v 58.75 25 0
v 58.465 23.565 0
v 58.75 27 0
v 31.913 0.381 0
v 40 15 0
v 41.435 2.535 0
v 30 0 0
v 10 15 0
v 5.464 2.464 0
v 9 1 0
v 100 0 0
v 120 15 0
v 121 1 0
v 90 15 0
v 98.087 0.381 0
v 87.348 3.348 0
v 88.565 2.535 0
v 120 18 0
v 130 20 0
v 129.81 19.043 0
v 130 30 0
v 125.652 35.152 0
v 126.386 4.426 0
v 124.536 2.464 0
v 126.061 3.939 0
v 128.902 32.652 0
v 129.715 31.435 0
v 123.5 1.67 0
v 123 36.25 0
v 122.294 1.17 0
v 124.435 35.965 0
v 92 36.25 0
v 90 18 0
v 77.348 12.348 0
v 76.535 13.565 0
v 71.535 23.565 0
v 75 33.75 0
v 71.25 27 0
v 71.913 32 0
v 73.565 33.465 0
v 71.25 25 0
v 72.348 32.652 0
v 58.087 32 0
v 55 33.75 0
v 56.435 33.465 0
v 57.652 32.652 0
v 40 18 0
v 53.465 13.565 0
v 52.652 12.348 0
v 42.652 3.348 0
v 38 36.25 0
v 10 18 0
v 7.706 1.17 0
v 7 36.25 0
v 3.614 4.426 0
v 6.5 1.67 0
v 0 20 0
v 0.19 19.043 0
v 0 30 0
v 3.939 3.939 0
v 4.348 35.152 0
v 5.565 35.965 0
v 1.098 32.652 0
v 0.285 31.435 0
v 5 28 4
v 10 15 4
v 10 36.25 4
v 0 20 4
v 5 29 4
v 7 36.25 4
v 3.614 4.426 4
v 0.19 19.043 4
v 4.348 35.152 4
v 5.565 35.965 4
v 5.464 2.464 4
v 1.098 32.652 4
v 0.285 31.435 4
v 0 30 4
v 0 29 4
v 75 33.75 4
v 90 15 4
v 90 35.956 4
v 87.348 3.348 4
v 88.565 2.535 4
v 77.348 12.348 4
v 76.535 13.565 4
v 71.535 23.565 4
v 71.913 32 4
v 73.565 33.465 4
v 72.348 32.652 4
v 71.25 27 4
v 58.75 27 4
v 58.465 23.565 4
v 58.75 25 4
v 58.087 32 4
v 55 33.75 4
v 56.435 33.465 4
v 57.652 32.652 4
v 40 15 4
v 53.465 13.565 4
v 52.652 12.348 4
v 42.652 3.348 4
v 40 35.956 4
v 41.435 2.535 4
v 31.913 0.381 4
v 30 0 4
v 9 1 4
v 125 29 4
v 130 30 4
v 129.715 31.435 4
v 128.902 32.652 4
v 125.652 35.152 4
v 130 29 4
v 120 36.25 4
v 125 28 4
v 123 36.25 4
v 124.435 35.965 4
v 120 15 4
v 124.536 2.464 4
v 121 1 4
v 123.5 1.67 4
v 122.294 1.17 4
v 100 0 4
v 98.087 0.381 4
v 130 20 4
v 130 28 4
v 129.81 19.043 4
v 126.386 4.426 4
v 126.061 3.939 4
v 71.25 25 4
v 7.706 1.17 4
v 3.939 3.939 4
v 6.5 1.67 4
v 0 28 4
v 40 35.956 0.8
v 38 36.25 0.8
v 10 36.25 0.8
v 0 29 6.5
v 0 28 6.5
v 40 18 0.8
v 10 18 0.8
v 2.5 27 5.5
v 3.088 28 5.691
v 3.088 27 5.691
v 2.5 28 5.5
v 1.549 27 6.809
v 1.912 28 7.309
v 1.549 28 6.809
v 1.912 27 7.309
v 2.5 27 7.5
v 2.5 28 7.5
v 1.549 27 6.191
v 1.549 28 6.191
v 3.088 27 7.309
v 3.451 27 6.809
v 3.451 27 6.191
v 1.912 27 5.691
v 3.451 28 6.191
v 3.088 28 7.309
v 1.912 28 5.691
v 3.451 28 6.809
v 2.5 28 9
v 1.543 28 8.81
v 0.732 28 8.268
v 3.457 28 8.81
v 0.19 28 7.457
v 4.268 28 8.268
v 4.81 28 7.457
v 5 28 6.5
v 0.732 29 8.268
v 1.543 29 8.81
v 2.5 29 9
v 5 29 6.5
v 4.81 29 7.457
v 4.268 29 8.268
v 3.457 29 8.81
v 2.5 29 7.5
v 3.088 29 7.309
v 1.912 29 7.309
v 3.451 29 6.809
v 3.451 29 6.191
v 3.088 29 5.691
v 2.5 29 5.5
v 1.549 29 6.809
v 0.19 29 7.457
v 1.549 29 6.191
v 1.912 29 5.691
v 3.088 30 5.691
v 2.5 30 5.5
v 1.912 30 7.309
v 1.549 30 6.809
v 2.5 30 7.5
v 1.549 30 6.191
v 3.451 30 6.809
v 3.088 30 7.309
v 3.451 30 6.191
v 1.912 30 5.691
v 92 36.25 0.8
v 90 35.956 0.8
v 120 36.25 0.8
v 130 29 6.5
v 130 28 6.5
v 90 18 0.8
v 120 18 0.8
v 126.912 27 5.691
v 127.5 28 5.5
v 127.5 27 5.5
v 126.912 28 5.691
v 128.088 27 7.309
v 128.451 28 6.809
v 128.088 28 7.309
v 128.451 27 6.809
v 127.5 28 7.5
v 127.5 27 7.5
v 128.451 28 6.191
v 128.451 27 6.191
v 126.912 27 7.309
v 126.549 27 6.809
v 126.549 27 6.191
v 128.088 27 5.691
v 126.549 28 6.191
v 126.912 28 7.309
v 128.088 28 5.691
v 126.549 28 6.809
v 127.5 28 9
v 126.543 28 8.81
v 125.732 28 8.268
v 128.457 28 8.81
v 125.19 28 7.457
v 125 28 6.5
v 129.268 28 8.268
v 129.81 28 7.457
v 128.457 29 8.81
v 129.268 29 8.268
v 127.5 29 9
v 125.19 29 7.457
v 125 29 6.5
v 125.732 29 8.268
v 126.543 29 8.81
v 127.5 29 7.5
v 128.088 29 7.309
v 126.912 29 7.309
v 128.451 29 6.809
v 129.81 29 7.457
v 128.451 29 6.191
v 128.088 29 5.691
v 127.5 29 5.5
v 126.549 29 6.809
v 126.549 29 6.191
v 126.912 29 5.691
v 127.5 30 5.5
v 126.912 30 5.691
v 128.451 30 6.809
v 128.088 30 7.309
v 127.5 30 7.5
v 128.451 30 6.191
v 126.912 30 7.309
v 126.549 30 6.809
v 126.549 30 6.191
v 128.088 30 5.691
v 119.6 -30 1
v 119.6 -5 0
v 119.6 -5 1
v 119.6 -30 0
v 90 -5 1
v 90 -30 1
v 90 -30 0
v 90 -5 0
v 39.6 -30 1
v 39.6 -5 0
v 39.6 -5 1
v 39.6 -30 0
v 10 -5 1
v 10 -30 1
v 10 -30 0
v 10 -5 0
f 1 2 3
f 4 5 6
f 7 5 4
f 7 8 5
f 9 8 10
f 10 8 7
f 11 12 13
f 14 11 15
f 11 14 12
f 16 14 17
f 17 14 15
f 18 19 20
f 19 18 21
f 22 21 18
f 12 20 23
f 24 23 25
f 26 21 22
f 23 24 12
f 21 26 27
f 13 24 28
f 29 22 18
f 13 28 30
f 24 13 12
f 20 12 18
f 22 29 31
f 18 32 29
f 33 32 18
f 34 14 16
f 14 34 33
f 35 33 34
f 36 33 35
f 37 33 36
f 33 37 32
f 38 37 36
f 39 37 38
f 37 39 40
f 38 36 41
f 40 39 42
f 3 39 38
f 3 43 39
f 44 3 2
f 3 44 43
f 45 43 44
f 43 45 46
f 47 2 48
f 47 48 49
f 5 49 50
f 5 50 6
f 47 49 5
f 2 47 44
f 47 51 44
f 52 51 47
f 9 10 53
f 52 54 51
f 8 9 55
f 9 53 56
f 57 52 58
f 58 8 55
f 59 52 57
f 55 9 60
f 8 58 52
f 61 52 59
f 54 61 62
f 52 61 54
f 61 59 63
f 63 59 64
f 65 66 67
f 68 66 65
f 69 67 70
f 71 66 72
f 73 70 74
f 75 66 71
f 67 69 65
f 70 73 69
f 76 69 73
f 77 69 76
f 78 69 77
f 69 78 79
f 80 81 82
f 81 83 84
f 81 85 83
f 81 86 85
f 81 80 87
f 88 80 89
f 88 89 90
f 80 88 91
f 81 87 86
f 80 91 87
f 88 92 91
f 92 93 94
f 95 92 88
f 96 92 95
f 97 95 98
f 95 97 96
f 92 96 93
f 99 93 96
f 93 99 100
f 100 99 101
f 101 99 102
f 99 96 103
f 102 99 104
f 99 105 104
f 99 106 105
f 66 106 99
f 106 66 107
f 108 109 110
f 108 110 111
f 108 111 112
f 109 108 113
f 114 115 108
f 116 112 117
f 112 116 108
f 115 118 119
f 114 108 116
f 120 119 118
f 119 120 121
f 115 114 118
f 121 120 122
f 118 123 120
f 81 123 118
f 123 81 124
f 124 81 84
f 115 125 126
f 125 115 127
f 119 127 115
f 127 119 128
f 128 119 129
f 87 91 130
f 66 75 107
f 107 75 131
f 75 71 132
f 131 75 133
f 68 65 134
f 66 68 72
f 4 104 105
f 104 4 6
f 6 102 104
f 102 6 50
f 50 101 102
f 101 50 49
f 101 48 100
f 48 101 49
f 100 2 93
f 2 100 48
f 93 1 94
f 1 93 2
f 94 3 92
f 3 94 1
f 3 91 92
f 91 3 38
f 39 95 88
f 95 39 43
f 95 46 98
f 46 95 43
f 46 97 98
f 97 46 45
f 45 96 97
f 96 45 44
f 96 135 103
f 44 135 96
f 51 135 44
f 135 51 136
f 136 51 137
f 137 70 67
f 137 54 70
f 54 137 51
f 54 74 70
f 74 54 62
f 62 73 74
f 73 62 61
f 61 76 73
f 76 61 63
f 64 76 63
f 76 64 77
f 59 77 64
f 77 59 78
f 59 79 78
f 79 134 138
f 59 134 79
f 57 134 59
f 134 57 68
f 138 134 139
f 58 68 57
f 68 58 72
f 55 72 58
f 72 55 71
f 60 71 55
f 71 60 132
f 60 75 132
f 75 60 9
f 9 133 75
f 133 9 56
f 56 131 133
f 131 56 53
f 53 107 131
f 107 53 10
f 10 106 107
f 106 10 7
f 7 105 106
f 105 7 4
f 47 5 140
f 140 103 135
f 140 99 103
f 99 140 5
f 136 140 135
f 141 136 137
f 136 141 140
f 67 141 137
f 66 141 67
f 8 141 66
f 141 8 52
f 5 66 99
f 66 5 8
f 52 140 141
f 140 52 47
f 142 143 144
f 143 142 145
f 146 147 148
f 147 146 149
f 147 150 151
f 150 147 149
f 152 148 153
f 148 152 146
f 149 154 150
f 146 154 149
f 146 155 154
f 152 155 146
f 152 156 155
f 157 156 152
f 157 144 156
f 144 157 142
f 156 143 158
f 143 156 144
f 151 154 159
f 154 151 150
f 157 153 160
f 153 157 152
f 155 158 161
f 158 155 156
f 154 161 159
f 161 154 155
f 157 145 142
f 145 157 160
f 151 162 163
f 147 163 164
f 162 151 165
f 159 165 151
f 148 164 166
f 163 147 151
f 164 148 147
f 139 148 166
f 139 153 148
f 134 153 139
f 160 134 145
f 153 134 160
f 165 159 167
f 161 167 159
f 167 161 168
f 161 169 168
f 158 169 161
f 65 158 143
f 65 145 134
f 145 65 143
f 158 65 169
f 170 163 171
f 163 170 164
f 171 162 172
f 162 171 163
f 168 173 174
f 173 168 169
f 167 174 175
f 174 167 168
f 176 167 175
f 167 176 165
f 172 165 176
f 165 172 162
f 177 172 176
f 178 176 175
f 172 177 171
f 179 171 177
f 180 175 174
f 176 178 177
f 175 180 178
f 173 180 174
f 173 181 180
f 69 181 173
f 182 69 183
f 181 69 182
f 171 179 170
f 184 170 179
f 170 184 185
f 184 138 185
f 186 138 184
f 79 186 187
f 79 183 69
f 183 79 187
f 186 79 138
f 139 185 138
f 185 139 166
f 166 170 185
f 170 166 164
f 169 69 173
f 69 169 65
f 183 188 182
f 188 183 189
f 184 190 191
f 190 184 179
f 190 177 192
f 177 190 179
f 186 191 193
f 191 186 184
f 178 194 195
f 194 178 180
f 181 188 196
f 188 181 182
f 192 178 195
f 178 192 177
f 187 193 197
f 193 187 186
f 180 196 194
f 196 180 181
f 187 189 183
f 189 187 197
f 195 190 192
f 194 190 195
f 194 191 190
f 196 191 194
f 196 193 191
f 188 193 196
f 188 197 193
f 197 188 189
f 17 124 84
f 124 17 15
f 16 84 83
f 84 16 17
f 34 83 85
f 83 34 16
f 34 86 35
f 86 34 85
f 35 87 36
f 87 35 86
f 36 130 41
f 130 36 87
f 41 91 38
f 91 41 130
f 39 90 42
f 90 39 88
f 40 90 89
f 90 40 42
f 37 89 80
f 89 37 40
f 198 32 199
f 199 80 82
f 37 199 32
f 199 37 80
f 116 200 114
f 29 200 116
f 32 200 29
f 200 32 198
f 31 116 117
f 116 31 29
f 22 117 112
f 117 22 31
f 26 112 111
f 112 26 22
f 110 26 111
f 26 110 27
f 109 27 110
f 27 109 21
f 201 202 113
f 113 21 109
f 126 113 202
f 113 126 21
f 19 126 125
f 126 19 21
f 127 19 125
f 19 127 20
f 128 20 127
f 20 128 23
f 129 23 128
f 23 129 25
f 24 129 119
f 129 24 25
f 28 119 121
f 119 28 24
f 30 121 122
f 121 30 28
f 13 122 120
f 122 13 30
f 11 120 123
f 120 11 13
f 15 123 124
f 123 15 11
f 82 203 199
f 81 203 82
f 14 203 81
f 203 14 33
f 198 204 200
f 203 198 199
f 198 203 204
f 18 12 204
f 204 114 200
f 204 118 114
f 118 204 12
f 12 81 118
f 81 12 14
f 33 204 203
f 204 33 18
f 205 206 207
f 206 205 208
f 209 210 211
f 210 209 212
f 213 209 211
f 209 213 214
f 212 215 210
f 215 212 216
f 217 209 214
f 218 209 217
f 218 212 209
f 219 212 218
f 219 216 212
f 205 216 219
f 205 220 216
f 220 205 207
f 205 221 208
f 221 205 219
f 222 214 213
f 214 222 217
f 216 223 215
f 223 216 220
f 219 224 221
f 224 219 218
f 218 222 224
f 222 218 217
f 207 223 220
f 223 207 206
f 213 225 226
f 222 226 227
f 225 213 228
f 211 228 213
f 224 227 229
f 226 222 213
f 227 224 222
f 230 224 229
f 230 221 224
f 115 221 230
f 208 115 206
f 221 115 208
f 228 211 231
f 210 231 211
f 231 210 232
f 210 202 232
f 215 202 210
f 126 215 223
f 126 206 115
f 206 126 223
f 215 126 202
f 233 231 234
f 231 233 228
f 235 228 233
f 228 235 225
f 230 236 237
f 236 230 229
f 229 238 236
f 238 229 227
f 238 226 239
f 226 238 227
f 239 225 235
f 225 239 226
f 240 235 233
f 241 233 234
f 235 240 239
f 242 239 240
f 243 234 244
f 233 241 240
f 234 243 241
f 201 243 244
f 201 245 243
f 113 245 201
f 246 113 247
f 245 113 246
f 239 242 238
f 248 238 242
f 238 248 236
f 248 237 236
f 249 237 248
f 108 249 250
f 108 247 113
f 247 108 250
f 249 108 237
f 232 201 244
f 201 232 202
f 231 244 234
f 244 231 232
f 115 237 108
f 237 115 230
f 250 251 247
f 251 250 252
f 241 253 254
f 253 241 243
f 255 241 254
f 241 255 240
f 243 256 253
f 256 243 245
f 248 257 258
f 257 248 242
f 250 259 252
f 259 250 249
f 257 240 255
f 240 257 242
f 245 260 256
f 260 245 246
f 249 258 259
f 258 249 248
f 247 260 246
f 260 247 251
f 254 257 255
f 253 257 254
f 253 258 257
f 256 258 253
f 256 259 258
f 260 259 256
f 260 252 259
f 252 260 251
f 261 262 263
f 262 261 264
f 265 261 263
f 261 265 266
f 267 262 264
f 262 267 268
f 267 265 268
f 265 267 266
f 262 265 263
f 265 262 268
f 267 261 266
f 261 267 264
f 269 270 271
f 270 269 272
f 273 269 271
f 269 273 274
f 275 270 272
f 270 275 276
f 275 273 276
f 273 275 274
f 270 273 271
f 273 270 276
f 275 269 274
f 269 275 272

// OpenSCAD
module frame_half() {
    difference() {
        linear_extrude(height=4){
            union() {    
                hull(){
                    translate([38, 32.5,0])
                        circle(d=7.5, $fn=16);

                    translate([7, 32.5,0])
                        circle(d=7.5, $fn=16);

                    translate([3.75, 30,0])
                        circle(d=7.5, $fn=16);

                    translate([2.5, 20,0])
                        circle(d=5, $fn=16);
                    
                    translate([5, 5,0])
                        circle(d=3, $fn=16);
                    
                    translate([9, 6, 0])
                        circle(d=10, $fn=24);
                    
                    translate([30, 5,0])
                        circle(d=10, $fn=16);

                    translate([40, 6,0])
                        circle(d=7.5, $fn=16);

                    translate([50, 15,0])
                        circle(d=7.5, $fn=16);
                    
                    translate([55, 25,0])
                        circle(d=7.5, $fn=16);

                    translate([55, 30,0])
                        circle(d=7.5, $fn=16);
                }
            
                
                translate([55,27,0])
                square([15,5]);
            }
        }

        translate([10,15,0.8])
        cube([30,25,2.4]);

        translate([10,15,-0.5])
        cube([30,3,5]);
        
        translate([10,15,1])
        cube([30,30,5]);
    }
}

module hinge() {

    translate([2.5,0,0])
    union() {
        translate([0,0,2])
        cylinder(h=1,d=2,$fn=10);

        translate([0,0,1])
        cylinder(h=1,d=5,$fn=16);

        translate([-2.5,-2.5,1])
        cube([2.5,5,1]);

        translate([0,0,0])
        cylinder(h=1,d=2,$fn=10);
    }
    
}

module frame_full() {
    frame_half();
    translate([2.5,30,4])
    rotate([90,-90,0])
        hinge();
}    

module body() {
    frame_full();

    translate([130,0,0])
    mirror([-1,0,0])
    frame_full();
}

module wing() {
}

module blind(){
    cube([30-0.4,25,1]);
}

body();

translate([90,-30,0])
blind();

translate([10,-30,0])
blind();
